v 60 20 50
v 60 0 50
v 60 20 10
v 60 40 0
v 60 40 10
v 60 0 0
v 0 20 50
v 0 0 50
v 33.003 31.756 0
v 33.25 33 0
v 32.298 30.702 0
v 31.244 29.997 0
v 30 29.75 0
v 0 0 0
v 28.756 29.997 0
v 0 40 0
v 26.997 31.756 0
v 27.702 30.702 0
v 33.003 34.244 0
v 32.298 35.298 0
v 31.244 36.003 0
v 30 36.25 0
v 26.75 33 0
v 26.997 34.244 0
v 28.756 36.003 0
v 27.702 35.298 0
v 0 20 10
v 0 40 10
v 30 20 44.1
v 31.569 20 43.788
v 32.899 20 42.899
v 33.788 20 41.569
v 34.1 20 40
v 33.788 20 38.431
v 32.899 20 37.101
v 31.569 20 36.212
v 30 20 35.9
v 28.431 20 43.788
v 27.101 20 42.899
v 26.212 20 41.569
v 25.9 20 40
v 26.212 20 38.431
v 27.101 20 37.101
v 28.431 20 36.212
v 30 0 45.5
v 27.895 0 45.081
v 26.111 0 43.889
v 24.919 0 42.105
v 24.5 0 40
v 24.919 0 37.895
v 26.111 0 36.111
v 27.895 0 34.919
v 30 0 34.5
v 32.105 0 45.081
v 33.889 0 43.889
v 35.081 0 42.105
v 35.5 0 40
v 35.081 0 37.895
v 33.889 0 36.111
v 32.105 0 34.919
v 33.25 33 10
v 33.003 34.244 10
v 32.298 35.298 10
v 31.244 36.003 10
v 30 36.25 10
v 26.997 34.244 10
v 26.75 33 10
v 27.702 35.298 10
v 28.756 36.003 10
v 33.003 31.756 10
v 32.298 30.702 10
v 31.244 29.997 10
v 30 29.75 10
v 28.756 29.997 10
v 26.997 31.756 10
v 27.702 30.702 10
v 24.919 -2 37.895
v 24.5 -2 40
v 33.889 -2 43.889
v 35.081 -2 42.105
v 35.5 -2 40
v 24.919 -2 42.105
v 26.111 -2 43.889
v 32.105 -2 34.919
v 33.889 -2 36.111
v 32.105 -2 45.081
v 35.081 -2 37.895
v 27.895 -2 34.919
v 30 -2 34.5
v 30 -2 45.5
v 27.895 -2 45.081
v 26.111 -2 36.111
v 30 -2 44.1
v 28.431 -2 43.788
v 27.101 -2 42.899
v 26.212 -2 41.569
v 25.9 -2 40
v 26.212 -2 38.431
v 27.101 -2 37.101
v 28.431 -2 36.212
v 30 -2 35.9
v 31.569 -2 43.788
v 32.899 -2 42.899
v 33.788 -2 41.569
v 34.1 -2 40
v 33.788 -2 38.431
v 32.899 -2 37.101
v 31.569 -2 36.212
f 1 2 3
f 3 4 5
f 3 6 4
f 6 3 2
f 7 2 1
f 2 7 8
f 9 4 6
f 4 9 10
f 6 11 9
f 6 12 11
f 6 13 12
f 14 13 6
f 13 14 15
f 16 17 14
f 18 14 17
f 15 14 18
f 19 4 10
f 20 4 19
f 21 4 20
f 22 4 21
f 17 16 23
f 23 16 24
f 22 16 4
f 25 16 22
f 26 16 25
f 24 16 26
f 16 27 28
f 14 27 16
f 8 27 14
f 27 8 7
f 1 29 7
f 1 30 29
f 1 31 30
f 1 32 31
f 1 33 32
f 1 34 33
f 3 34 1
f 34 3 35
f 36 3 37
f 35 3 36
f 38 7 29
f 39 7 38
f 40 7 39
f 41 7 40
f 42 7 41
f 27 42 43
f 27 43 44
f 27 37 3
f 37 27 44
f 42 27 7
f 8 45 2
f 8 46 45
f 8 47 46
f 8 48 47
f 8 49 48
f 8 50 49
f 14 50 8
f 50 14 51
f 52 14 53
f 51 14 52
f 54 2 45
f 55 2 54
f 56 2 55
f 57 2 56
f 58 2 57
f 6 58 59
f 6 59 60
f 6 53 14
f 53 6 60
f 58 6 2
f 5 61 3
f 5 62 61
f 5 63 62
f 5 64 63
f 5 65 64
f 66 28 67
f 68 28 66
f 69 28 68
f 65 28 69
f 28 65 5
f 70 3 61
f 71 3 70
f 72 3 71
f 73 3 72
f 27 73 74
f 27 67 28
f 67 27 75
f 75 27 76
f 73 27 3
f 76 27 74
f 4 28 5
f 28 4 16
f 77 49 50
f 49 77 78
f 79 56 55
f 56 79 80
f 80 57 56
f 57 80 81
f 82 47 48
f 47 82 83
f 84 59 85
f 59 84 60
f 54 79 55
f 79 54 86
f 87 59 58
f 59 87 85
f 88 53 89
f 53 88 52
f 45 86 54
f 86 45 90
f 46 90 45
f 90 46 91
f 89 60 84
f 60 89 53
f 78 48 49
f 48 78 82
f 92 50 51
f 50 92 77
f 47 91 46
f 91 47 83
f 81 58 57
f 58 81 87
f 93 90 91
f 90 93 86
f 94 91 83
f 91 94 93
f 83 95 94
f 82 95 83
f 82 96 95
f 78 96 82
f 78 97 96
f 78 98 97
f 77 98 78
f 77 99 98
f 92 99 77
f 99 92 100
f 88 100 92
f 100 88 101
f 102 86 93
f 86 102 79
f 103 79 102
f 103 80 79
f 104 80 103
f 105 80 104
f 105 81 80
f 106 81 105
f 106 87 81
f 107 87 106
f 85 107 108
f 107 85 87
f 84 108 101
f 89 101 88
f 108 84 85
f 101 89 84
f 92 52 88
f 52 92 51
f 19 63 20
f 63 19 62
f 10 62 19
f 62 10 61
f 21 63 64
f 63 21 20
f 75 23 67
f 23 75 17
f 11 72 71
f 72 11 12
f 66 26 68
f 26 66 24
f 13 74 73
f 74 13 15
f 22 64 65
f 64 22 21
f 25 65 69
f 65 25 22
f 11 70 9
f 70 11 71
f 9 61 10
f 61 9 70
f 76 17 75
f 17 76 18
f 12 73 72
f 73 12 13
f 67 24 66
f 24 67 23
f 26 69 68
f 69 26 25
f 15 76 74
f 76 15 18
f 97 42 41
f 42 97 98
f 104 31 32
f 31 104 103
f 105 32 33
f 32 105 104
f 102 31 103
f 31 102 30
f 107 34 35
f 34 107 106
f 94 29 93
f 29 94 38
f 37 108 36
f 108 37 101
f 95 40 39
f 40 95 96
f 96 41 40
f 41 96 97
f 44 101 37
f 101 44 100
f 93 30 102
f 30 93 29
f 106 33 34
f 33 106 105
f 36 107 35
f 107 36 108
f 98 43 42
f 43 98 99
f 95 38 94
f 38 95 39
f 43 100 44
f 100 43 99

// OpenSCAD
$fn = 16;
/*
basic dimensions
*/
cy_thickness = 20;
cx_length = 60;
cz_height = 50;

/*
support step dimensions
*/
cy_support_width = 20;
c_support_hole_size = 6.5;
cz_support_height = 10;
//screw hole postition from sides
cx_support_screw_pos = 20;
//screw hole postition from edge
cy_support_screw_pos = 7;
c_support_screw_count = 1;

c_support_screw_pos = (cx_length - (cx_support_screw_pos * 2)) / (c_support_screw_count - 1);

c_bearing_hole_size = 8.2;
c_bearing_washer_size = 11;
cy_bearing_washer_thickness = 2;
c_bearing_hole_count = 1;
c_bearing_hole_from_top = 10;
cx_bearing_hole_pos = 16;

c_bearing_pos = (cx_length - (cx_bearing_hole_pos * 2)) / (c_bearing_hole_count - 1);

run = 1;

module create_bulk() {
    cube([cx_length, cy_thickness, cz_height]);  
}


module create_support() {
    translate([0, cy_thickness, 0])
        cube([cx_length, cy_support_width, cz_support_height]);
}


module create_support_screwhole(){
    if (c_support_screw_count > 1) {
    for (sh = [cx_support_screw_pos:c_support_screw_pos:c_support_screw_pos*c_support_screw_count])
        translate([sh, cy_thickness+cy_support_width-cy_support_screw_pos, -1] ) 
            cylinder(h = cz_support_height+2, r = c_support_hole_size/2);
    } else {
        translate([cx_length / 2, cy_thickness+cy_support_width-cy_support_screw_pos, -1] ) 
            cylinder(h = cz_support_height+2, r = c_support_hole_size/2);

    }
}


module create_bearing_holes() {
    if (c_bearing_hole_count > 1) {
    for (sh = [cx_bearing_hole_pos:c_bearing_pos:c_bearing_pos*c_bearing_hole_count])
        translate([sh, cy_thickness-cy_bearing_washer_thickness+5, cz_height-c_bearing_hole_from_top]) {
            rotate([90, 0, 0]) 
                cylinder(h = cy_thickness+cy_bearing_washer_thickness+5, r = c_bearing_hole_size/2);
        }
    } else {
        translate([cx_length / 2, cy_thickness-cy_bearing_washer_thickness+5, cz_height-c_bearing_hole_from_top]) {
            rotate([90, 0, 0]) 
                cylinder(h = cy_thickness+cy_bearing_washer_thickness+5, r = c_bearing_hole_size/2);
        }
    }
}


module create_bearing_washers() {
    if (c_bearing_hole_count > 1) {
    for (sh = [cx_bearing_hole_pos:c_bearing_pos:c_bearing_pos*c_bearing_hole_count])
        translate([sh, cy_thickness, cz_height-c_bearing_hole_from_top]) {
            rotate([90, 0, 0]) 
                cylinder(h = cy_thickness+cy_bearing_washer_thickness, r = c_bearing_washer_size/2);
        }
    } else {
        translate([cx_length / 2, cy_thickness, cz_height-c_bearing_hole_from_top]) {
            rotate([90, 0, 0]) 
                cylinder(h = cy_thickness+cy_bearing_washer_thickness, r = c_bearing_washer_size/2);
        }
    }
}


if (run == 1) {
    difference() {
        union() {
            create_bulk();
            create_support();
            create_bearing_washers();
        }
        create_support_screwhole();
        create_bearing_holes();
    }
}
